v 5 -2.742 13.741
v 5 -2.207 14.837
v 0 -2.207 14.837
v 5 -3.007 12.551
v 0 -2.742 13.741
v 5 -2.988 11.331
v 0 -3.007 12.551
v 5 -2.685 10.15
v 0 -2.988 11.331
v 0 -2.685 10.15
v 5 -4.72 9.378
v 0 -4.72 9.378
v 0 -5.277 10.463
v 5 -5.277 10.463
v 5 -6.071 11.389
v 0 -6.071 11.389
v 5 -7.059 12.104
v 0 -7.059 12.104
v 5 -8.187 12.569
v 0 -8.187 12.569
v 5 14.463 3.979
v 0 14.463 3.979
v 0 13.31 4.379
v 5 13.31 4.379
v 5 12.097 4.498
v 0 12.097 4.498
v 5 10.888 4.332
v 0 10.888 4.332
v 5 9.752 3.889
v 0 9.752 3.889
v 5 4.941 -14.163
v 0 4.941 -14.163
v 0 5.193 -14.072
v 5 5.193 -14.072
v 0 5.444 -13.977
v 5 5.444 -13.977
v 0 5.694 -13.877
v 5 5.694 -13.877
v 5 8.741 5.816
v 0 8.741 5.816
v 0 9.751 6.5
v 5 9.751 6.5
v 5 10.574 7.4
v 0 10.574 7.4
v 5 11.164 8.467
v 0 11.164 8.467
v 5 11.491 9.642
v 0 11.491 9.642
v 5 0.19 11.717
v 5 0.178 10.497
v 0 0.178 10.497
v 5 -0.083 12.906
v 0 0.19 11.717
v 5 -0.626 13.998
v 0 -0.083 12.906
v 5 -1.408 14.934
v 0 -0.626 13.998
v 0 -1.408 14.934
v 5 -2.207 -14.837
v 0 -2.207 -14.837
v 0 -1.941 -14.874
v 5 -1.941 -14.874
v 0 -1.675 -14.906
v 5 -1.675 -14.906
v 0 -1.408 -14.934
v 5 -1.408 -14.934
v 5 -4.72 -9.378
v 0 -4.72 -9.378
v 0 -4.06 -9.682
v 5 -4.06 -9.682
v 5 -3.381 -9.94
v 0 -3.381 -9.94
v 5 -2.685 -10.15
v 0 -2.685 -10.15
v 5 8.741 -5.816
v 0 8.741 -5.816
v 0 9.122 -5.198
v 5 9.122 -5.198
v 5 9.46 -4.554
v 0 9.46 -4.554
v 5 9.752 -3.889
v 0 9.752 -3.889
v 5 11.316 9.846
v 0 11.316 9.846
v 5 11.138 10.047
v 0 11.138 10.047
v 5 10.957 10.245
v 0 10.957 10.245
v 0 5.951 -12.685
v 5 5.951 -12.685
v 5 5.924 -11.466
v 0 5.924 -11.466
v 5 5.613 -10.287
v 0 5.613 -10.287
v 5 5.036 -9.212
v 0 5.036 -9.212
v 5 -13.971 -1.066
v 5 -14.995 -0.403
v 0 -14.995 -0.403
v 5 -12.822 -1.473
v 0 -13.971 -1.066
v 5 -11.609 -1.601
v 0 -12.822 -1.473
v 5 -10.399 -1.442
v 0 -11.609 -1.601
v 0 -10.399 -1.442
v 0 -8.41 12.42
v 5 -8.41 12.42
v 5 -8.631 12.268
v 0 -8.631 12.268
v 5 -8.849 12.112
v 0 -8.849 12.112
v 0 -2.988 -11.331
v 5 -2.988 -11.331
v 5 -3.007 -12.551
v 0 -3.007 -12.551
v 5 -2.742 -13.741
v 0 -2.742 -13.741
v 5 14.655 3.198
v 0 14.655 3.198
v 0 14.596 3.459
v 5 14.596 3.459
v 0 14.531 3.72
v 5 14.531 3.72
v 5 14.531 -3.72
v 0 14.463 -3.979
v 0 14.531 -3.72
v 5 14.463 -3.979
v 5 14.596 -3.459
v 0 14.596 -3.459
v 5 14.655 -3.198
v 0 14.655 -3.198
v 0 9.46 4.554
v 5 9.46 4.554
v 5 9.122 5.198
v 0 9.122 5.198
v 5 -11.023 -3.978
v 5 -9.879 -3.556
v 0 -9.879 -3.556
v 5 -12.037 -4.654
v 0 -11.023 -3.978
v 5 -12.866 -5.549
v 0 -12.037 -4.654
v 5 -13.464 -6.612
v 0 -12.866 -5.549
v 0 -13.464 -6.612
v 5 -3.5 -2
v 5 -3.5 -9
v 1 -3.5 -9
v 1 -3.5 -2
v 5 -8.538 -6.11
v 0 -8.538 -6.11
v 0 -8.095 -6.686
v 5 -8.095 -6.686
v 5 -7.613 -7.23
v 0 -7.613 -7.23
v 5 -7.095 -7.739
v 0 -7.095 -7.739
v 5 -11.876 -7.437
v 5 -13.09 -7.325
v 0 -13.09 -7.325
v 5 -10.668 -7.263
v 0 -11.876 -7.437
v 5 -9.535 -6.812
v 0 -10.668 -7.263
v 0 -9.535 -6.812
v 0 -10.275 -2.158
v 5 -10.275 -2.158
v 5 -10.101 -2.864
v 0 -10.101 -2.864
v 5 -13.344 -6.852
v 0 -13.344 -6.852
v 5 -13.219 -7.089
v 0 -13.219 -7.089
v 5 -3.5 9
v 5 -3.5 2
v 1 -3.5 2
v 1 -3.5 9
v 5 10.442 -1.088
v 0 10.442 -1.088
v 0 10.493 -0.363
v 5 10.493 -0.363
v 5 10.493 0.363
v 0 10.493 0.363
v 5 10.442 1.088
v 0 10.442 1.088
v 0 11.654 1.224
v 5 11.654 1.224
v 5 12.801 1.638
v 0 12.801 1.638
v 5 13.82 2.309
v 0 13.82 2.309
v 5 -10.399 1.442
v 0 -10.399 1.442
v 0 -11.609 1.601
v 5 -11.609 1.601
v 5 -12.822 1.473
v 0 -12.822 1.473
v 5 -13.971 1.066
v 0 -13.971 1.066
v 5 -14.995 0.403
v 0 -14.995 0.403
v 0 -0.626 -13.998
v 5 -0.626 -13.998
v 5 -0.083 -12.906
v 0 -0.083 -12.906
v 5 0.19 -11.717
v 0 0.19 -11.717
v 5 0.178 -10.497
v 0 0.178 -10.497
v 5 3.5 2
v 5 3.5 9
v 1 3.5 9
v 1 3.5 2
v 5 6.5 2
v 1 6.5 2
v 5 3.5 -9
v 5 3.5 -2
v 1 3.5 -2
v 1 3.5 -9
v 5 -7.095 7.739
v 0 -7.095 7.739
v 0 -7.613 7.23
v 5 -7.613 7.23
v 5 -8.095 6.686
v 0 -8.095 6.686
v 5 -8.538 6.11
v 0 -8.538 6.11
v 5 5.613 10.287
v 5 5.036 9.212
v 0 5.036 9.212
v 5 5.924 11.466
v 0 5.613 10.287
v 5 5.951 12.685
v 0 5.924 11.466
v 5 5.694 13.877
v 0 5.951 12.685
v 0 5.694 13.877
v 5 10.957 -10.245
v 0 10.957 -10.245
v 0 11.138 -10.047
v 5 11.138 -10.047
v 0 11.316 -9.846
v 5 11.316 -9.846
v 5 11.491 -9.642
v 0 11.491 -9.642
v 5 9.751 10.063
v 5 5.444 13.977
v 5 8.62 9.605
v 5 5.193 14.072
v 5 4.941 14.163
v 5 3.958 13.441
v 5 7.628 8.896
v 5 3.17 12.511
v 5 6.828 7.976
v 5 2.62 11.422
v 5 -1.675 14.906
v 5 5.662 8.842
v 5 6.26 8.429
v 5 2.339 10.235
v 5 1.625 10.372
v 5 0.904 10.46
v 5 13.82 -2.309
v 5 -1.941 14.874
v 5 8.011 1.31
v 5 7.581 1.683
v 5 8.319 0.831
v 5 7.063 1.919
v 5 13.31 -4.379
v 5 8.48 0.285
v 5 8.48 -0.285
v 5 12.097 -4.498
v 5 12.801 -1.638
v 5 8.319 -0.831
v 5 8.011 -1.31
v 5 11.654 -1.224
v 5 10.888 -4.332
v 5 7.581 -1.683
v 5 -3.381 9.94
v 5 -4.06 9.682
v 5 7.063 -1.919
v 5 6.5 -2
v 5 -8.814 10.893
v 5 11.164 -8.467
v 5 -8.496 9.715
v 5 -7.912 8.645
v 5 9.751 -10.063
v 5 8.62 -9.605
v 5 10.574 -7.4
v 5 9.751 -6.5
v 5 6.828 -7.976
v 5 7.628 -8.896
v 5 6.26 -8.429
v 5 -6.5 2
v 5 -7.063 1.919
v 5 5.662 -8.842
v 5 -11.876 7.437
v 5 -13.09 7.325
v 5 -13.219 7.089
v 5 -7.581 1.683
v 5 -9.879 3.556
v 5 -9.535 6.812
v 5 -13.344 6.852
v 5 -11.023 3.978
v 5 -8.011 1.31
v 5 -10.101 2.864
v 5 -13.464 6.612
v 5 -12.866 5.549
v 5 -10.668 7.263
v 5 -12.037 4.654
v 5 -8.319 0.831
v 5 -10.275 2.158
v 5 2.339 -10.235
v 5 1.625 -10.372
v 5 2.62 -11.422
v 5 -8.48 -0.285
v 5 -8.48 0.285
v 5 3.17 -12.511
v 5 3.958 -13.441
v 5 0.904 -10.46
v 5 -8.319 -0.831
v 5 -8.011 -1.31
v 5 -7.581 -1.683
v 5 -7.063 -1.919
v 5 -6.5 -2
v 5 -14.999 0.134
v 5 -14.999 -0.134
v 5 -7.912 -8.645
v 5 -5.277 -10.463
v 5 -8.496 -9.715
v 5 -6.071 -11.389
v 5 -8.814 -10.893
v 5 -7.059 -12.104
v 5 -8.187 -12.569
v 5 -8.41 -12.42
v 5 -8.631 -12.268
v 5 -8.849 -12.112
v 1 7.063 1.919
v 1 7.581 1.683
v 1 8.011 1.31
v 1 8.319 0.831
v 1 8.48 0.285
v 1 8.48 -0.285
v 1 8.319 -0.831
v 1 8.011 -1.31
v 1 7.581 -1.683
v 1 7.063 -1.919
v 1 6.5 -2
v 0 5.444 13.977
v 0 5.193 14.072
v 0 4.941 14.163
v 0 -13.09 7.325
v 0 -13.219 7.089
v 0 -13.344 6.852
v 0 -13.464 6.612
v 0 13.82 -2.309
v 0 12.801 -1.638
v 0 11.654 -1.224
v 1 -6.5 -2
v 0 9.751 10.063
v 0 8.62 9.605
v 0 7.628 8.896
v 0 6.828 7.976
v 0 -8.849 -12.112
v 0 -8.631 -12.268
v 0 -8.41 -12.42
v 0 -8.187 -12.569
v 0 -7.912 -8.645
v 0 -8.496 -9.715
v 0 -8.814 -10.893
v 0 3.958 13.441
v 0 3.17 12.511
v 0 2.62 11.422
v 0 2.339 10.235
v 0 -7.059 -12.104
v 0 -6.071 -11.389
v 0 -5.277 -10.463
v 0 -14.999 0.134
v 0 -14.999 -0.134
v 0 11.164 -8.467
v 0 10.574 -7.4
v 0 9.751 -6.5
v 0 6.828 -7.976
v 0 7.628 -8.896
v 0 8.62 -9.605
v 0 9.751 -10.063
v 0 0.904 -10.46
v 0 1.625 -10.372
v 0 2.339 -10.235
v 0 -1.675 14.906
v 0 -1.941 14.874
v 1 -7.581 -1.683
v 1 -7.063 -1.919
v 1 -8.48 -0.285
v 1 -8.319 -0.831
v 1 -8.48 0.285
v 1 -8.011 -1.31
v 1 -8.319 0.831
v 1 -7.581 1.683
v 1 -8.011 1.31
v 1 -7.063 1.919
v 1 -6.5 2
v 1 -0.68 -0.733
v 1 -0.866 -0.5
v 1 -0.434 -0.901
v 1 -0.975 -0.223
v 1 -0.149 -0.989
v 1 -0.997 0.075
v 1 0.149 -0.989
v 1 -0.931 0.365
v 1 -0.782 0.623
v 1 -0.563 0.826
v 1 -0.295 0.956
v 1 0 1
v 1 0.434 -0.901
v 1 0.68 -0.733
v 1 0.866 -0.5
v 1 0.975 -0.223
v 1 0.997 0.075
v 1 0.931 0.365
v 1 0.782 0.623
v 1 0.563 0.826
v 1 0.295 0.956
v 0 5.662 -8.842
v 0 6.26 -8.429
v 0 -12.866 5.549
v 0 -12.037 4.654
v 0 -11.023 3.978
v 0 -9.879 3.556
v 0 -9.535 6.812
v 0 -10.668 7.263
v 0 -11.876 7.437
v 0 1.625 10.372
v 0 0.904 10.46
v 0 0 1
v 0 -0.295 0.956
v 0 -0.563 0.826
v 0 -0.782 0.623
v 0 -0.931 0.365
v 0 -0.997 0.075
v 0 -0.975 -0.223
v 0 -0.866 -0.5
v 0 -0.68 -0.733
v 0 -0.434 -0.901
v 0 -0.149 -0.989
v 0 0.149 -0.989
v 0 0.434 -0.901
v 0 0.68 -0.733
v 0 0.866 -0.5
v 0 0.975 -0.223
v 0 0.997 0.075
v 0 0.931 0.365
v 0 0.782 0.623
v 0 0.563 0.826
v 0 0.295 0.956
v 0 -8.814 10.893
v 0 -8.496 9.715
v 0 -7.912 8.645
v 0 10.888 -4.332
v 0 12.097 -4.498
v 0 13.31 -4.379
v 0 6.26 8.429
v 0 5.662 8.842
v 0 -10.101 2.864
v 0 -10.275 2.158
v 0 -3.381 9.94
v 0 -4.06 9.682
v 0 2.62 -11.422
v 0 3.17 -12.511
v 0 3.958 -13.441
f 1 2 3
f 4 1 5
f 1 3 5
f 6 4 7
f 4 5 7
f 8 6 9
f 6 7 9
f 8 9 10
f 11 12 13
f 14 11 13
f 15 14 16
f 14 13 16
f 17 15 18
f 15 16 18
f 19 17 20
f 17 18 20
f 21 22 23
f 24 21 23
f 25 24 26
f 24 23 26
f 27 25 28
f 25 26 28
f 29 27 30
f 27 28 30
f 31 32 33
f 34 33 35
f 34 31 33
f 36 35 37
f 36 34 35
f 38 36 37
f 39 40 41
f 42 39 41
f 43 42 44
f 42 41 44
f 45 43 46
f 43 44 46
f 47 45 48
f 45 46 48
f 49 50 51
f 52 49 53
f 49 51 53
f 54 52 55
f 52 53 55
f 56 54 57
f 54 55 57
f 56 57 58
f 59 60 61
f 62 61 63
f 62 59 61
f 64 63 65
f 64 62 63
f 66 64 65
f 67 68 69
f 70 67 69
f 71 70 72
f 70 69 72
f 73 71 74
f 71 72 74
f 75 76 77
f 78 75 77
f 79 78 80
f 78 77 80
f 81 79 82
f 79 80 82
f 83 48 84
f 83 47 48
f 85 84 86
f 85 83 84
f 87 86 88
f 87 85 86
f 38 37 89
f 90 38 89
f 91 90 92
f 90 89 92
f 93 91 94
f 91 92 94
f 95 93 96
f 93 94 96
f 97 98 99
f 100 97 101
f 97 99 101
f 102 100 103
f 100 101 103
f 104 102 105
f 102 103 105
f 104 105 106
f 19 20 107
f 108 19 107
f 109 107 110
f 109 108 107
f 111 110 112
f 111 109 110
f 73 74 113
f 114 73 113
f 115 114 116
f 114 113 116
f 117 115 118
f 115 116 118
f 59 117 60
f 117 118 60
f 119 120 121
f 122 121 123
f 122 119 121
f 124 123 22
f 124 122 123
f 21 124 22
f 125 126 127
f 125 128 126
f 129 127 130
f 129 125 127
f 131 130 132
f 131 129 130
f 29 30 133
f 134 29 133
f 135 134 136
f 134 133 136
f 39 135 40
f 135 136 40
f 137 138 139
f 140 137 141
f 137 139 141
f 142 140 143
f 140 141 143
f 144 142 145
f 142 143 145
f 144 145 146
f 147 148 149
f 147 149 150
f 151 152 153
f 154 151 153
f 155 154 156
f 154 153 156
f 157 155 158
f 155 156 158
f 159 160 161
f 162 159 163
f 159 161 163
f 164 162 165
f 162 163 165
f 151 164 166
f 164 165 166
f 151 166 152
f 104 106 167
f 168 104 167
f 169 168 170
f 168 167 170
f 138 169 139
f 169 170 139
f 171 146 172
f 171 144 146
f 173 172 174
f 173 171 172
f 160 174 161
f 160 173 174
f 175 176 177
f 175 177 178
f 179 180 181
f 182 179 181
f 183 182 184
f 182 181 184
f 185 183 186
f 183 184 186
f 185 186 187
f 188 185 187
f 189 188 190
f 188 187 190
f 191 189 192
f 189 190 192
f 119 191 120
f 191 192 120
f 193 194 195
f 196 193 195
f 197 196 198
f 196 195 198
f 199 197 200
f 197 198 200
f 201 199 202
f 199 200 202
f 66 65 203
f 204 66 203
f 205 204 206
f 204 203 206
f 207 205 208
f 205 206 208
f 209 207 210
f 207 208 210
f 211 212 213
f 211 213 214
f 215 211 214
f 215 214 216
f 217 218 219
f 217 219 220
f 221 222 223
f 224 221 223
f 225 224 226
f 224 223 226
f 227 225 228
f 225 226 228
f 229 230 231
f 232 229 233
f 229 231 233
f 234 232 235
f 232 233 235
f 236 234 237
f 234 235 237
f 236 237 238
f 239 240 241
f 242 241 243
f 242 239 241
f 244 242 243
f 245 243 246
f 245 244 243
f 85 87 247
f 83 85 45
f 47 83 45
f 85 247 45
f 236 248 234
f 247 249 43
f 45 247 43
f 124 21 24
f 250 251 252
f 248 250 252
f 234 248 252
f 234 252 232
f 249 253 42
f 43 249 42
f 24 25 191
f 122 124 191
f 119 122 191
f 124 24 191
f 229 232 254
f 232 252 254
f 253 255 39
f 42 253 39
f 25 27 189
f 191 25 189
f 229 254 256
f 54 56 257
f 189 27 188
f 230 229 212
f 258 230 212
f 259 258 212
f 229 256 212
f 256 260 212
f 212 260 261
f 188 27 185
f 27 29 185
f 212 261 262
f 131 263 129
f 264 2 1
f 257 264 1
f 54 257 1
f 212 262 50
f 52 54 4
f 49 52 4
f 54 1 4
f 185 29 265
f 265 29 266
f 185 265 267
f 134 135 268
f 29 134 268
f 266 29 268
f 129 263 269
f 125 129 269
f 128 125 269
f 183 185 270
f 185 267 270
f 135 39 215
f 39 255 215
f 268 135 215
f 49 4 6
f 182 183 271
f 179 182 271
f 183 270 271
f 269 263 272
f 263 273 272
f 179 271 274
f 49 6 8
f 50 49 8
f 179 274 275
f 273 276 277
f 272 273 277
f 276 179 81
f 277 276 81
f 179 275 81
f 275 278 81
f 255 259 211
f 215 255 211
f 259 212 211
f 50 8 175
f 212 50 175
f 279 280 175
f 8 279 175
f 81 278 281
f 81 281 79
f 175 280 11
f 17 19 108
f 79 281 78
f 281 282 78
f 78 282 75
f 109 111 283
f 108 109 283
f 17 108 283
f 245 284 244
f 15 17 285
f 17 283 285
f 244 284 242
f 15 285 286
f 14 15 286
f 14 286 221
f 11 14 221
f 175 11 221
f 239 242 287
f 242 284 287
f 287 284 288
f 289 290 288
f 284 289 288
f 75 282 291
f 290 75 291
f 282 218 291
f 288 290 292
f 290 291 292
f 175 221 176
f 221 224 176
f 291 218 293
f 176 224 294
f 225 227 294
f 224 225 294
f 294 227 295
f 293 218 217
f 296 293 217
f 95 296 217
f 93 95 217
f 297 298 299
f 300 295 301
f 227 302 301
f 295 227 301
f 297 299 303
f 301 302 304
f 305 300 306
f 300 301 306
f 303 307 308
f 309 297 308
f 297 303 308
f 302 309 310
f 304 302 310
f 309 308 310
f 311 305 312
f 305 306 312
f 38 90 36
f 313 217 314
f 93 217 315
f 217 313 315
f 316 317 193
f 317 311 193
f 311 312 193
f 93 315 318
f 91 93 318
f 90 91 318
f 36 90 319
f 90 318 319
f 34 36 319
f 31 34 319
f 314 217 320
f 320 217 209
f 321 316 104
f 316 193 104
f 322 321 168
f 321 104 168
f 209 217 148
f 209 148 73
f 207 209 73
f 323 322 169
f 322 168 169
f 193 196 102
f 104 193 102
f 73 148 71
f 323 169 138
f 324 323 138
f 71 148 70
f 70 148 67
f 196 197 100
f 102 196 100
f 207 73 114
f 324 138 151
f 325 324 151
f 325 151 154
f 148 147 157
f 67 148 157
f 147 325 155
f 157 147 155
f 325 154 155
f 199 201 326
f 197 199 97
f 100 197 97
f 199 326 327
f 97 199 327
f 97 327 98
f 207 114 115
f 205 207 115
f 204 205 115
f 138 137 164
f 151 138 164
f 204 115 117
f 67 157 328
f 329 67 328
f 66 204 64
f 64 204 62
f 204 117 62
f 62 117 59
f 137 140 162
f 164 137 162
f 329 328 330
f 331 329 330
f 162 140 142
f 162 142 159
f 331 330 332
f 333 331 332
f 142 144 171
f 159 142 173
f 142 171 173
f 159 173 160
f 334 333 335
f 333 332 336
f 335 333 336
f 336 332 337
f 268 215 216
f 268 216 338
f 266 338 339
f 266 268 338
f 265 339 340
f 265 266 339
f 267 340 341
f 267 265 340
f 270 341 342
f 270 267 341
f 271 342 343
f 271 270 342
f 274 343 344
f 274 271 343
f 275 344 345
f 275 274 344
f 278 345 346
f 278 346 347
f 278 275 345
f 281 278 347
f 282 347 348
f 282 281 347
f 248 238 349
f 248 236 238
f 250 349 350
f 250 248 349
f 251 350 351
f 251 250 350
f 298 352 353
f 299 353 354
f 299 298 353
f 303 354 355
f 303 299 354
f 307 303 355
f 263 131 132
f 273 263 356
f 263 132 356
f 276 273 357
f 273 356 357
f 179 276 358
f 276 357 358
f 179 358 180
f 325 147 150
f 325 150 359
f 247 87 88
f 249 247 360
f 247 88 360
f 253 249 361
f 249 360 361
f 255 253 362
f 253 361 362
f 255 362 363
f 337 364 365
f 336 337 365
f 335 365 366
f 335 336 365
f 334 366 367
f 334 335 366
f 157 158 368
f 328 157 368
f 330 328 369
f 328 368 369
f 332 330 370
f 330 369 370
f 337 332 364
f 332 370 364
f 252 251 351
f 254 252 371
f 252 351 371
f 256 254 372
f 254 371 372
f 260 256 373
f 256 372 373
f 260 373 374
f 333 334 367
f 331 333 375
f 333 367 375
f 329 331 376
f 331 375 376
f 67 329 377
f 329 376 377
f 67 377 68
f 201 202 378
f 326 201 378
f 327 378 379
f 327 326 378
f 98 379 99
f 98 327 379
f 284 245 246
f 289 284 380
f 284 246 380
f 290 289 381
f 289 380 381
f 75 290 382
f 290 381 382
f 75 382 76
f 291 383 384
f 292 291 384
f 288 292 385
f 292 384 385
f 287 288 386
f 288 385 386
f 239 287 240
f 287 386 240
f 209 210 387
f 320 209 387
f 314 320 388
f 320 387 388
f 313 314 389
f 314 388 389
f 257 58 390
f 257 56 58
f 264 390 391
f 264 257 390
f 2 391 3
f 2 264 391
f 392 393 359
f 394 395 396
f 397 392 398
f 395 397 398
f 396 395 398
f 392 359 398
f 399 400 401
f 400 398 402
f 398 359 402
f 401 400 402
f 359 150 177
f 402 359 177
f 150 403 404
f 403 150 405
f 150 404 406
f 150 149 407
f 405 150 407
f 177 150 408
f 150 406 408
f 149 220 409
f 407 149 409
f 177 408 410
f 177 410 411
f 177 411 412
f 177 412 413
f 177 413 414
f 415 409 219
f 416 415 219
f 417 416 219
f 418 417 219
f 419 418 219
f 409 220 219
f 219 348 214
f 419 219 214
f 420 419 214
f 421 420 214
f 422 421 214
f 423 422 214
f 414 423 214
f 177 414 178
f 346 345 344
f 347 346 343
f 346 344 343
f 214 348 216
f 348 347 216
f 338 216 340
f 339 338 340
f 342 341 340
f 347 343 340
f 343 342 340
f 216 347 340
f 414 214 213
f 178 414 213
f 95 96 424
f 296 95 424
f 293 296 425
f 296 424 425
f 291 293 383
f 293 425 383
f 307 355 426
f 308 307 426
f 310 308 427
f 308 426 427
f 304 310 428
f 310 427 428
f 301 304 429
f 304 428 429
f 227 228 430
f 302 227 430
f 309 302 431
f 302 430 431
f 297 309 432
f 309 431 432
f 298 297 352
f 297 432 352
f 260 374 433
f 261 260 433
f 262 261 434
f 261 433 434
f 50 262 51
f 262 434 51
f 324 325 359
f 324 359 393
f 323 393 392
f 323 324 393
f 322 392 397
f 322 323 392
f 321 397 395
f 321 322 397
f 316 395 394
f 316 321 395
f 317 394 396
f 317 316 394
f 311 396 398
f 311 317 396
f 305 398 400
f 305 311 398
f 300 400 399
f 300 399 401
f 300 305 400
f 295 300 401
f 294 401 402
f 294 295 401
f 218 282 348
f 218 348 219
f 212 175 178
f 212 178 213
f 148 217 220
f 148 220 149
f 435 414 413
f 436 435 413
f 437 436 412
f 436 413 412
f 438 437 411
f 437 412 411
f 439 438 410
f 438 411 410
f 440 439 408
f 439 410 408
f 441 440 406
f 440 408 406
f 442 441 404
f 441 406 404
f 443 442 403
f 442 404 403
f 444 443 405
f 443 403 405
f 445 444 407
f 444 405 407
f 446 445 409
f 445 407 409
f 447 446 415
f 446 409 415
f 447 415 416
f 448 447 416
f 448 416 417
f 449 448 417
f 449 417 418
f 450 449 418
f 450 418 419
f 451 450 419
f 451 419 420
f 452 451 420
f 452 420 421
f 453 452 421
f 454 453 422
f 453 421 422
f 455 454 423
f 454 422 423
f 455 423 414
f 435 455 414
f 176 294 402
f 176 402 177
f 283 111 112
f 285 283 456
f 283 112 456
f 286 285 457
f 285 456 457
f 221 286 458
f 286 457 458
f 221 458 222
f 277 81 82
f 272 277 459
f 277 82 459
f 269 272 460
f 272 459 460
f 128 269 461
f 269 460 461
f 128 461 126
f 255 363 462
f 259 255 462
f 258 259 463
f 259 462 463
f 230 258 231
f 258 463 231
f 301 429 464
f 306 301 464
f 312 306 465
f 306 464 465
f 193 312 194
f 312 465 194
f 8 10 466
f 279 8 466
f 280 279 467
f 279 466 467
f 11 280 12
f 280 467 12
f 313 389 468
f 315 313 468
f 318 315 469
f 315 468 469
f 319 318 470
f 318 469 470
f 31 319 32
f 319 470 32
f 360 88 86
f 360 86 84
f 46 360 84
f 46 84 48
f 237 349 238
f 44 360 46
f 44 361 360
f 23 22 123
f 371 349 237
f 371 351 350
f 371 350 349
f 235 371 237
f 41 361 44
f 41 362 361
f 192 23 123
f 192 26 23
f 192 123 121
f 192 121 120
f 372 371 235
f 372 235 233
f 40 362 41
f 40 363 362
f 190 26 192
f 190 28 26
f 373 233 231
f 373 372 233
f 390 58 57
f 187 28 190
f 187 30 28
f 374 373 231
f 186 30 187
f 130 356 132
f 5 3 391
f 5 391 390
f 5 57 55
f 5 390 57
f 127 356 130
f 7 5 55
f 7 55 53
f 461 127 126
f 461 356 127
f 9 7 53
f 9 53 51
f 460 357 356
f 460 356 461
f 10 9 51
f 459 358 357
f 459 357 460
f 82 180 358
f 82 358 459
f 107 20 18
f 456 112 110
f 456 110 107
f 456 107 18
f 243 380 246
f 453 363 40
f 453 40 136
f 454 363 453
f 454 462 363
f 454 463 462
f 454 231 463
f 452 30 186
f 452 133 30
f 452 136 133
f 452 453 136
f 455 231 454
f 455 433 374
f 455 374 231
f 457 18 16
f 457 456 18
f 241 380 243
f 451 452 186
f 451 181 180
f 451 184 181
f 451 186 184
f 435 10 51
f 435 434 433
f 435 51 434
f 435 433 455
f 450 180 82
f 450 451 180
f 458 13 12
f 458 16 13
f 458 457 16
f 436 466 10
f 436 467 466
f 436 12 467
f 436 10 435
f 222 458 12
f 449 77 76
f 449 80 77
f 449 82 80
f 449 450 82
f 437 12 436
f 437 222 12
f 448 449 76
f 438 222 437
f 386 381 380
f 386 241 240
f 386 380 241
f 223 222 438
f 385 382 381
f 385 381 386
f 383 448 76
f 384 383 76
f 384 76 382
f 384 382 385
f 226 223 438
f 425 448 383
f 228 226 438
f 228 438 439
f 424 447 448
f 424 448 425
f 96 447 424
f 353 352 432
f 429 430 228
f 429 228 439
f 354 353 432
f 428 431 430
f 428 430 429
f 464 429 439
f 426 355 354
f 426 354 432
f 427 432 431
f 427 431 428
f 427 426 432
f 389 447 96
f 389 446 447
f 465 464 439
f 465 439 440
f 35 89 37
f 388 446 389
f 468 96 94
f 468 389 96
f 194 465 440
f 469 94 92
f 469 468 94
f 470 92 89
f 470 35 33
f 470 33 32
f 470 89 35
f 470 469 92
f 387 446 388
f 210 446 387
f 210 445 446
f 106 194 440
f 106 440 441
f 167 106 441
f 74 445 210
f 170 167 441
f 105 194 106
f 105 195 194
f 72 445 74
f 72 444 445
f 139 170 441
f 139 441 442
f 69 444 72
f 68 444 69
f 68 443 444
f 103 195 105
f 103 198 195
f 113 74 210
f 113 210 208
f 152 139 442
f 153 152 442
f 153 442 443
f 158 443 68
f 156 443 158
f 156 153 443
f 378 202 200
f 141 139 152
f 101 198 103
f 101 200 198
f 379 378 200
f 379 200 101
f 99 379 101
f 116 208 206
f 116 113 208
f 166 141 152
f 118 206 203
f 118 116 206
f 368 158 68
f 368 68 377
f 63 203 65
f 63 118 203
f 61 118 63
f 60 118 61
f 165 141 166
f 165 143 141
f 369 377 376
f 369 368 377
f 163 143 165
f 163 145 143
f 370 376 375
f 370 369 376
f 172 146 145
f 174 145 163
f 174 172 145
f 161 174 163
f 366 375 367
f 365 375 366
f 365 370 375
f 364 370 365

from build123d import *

# Parameters (mm, degrees)
BASPROSKE_W        = 5
BASPROSKE_H        = 15
TOOTHCUT_DEPTH     = 22.794494718
TEETHCUTS_COUNT    = 13
TEETHCUTS_ANGLE    = 332.307692308
BORSKE_R           = 1
BORE_DEPTH         = 50.0000508
CUT_EXTRUDE1_DEPTH = 4


with BuildPart() as part:
    # BasProSke → Base-Revolve (revolve)
    with BuildSketch(Plane(origin=(0, 0, 0), x_dir=(1, 0, 0), z_dir=(0, 1, 0)), mode=Mode.PRIVATE) as base_revolve_sk:
        with Locations((2.5, 7.5)):
            Rectangle(BASPROSKE_W, BASPROSKE_H)
    revolve(base_revolve_sk.sketch.rotate(Axis((-10, 0, 0), (1, 0, 0)), 180), axis=Axis((-10, 0, 0), (1, 0, 0)))

    # TooCutSke → ToothCut (cut, through all)
    with BuildSketch(Plane(origin=(0, 0, 0), x_dir=(0, 0, -1), z_dir=(1, 0, 0))):
        with BuildLine():
            ThreePointArc((1.088245291, 10.442448141), (0, 10.499), (-1.088245291, 10.442448141))
            ThreePointArc((-1.088245291, 10.442448141), (-1.646045958, 12.816546547), (-3.224884568, 14.675243258))
            ThreePointArc((-3.224884568, 14.675243258), (0, 15.0254), (3.224884568, 14.675243258))
            ThreePointArc((3.224884568, 14.675243258), (1.646045958, 12.816546547), (1.088245291, 10.442448141))
        make_face()
    toothcut = extrude(amount=TOOTHCUT_DEPTH, mode=Mode.SUBTRACT)

    # TeethCuts: ToothCut ×13 about axis
    teethcuts_axis = Axis((-10, 0, 0), (1, 0, 0))
    for i in range(1, TEETHCUTS_COUNT):
        add(toothcut.rotate(teethcuts_axis, i * TEETHCUTS_ANGLE / (TEETHCUTS_COUNT - 1)), mode=Mode.SUBTRACT)

    # BorSke → Bore (cut, symmetric)
    with BuildSketch(Plane(origin=(0, 0, 0), x_dir=(0, 0, -1), z_dir=(1, 0, 0))):
        with Locations(Location((0, 0, 0), (0, 0, 180))):
            Circle(BORSKE_R)
    extrude(amount=BORE_DEPTH, both=True, mode=Mode.SUBTRACT)

    # Sketch1 → Cut-Extrude1 (cut)
    with BuildSketch(Plane(origin=(5, 0, 0), x_dir=(0, 0, -1), z_dir=(1, 0, 0))):
        with BuildLine():
            Line((2, 6.5), (2, 3.5))
            Line((2, 3.5), (9, 3.5))
            Line((9, 3.5), (9, -3.5))
            Line((9, -3.5), (2, -3.5))
            Line((2, -3.5), (2, -6.5))
            ThreePointArc((2, -6.5), (0, -8.5), (-2, -6.5))
            Line((-2, -6.5), (-2, -3.5))
            Line((-2, -3.5), (-9, -3.5))
            Line((-9, -3.5), (-9, 3.5))
            Line((-9, 3.5), (-2, 3.5))
            Line((-2, 3.5), (-2, 6.5))
            ThreePointArc((-2, 6.5), (0, 8.5), (2, 6.5))
        make_face()
    extrude(amount=-CUT_EXTRUDE1_DEPTH, mode=Mode.SUBTRACT)


solid = part.part
